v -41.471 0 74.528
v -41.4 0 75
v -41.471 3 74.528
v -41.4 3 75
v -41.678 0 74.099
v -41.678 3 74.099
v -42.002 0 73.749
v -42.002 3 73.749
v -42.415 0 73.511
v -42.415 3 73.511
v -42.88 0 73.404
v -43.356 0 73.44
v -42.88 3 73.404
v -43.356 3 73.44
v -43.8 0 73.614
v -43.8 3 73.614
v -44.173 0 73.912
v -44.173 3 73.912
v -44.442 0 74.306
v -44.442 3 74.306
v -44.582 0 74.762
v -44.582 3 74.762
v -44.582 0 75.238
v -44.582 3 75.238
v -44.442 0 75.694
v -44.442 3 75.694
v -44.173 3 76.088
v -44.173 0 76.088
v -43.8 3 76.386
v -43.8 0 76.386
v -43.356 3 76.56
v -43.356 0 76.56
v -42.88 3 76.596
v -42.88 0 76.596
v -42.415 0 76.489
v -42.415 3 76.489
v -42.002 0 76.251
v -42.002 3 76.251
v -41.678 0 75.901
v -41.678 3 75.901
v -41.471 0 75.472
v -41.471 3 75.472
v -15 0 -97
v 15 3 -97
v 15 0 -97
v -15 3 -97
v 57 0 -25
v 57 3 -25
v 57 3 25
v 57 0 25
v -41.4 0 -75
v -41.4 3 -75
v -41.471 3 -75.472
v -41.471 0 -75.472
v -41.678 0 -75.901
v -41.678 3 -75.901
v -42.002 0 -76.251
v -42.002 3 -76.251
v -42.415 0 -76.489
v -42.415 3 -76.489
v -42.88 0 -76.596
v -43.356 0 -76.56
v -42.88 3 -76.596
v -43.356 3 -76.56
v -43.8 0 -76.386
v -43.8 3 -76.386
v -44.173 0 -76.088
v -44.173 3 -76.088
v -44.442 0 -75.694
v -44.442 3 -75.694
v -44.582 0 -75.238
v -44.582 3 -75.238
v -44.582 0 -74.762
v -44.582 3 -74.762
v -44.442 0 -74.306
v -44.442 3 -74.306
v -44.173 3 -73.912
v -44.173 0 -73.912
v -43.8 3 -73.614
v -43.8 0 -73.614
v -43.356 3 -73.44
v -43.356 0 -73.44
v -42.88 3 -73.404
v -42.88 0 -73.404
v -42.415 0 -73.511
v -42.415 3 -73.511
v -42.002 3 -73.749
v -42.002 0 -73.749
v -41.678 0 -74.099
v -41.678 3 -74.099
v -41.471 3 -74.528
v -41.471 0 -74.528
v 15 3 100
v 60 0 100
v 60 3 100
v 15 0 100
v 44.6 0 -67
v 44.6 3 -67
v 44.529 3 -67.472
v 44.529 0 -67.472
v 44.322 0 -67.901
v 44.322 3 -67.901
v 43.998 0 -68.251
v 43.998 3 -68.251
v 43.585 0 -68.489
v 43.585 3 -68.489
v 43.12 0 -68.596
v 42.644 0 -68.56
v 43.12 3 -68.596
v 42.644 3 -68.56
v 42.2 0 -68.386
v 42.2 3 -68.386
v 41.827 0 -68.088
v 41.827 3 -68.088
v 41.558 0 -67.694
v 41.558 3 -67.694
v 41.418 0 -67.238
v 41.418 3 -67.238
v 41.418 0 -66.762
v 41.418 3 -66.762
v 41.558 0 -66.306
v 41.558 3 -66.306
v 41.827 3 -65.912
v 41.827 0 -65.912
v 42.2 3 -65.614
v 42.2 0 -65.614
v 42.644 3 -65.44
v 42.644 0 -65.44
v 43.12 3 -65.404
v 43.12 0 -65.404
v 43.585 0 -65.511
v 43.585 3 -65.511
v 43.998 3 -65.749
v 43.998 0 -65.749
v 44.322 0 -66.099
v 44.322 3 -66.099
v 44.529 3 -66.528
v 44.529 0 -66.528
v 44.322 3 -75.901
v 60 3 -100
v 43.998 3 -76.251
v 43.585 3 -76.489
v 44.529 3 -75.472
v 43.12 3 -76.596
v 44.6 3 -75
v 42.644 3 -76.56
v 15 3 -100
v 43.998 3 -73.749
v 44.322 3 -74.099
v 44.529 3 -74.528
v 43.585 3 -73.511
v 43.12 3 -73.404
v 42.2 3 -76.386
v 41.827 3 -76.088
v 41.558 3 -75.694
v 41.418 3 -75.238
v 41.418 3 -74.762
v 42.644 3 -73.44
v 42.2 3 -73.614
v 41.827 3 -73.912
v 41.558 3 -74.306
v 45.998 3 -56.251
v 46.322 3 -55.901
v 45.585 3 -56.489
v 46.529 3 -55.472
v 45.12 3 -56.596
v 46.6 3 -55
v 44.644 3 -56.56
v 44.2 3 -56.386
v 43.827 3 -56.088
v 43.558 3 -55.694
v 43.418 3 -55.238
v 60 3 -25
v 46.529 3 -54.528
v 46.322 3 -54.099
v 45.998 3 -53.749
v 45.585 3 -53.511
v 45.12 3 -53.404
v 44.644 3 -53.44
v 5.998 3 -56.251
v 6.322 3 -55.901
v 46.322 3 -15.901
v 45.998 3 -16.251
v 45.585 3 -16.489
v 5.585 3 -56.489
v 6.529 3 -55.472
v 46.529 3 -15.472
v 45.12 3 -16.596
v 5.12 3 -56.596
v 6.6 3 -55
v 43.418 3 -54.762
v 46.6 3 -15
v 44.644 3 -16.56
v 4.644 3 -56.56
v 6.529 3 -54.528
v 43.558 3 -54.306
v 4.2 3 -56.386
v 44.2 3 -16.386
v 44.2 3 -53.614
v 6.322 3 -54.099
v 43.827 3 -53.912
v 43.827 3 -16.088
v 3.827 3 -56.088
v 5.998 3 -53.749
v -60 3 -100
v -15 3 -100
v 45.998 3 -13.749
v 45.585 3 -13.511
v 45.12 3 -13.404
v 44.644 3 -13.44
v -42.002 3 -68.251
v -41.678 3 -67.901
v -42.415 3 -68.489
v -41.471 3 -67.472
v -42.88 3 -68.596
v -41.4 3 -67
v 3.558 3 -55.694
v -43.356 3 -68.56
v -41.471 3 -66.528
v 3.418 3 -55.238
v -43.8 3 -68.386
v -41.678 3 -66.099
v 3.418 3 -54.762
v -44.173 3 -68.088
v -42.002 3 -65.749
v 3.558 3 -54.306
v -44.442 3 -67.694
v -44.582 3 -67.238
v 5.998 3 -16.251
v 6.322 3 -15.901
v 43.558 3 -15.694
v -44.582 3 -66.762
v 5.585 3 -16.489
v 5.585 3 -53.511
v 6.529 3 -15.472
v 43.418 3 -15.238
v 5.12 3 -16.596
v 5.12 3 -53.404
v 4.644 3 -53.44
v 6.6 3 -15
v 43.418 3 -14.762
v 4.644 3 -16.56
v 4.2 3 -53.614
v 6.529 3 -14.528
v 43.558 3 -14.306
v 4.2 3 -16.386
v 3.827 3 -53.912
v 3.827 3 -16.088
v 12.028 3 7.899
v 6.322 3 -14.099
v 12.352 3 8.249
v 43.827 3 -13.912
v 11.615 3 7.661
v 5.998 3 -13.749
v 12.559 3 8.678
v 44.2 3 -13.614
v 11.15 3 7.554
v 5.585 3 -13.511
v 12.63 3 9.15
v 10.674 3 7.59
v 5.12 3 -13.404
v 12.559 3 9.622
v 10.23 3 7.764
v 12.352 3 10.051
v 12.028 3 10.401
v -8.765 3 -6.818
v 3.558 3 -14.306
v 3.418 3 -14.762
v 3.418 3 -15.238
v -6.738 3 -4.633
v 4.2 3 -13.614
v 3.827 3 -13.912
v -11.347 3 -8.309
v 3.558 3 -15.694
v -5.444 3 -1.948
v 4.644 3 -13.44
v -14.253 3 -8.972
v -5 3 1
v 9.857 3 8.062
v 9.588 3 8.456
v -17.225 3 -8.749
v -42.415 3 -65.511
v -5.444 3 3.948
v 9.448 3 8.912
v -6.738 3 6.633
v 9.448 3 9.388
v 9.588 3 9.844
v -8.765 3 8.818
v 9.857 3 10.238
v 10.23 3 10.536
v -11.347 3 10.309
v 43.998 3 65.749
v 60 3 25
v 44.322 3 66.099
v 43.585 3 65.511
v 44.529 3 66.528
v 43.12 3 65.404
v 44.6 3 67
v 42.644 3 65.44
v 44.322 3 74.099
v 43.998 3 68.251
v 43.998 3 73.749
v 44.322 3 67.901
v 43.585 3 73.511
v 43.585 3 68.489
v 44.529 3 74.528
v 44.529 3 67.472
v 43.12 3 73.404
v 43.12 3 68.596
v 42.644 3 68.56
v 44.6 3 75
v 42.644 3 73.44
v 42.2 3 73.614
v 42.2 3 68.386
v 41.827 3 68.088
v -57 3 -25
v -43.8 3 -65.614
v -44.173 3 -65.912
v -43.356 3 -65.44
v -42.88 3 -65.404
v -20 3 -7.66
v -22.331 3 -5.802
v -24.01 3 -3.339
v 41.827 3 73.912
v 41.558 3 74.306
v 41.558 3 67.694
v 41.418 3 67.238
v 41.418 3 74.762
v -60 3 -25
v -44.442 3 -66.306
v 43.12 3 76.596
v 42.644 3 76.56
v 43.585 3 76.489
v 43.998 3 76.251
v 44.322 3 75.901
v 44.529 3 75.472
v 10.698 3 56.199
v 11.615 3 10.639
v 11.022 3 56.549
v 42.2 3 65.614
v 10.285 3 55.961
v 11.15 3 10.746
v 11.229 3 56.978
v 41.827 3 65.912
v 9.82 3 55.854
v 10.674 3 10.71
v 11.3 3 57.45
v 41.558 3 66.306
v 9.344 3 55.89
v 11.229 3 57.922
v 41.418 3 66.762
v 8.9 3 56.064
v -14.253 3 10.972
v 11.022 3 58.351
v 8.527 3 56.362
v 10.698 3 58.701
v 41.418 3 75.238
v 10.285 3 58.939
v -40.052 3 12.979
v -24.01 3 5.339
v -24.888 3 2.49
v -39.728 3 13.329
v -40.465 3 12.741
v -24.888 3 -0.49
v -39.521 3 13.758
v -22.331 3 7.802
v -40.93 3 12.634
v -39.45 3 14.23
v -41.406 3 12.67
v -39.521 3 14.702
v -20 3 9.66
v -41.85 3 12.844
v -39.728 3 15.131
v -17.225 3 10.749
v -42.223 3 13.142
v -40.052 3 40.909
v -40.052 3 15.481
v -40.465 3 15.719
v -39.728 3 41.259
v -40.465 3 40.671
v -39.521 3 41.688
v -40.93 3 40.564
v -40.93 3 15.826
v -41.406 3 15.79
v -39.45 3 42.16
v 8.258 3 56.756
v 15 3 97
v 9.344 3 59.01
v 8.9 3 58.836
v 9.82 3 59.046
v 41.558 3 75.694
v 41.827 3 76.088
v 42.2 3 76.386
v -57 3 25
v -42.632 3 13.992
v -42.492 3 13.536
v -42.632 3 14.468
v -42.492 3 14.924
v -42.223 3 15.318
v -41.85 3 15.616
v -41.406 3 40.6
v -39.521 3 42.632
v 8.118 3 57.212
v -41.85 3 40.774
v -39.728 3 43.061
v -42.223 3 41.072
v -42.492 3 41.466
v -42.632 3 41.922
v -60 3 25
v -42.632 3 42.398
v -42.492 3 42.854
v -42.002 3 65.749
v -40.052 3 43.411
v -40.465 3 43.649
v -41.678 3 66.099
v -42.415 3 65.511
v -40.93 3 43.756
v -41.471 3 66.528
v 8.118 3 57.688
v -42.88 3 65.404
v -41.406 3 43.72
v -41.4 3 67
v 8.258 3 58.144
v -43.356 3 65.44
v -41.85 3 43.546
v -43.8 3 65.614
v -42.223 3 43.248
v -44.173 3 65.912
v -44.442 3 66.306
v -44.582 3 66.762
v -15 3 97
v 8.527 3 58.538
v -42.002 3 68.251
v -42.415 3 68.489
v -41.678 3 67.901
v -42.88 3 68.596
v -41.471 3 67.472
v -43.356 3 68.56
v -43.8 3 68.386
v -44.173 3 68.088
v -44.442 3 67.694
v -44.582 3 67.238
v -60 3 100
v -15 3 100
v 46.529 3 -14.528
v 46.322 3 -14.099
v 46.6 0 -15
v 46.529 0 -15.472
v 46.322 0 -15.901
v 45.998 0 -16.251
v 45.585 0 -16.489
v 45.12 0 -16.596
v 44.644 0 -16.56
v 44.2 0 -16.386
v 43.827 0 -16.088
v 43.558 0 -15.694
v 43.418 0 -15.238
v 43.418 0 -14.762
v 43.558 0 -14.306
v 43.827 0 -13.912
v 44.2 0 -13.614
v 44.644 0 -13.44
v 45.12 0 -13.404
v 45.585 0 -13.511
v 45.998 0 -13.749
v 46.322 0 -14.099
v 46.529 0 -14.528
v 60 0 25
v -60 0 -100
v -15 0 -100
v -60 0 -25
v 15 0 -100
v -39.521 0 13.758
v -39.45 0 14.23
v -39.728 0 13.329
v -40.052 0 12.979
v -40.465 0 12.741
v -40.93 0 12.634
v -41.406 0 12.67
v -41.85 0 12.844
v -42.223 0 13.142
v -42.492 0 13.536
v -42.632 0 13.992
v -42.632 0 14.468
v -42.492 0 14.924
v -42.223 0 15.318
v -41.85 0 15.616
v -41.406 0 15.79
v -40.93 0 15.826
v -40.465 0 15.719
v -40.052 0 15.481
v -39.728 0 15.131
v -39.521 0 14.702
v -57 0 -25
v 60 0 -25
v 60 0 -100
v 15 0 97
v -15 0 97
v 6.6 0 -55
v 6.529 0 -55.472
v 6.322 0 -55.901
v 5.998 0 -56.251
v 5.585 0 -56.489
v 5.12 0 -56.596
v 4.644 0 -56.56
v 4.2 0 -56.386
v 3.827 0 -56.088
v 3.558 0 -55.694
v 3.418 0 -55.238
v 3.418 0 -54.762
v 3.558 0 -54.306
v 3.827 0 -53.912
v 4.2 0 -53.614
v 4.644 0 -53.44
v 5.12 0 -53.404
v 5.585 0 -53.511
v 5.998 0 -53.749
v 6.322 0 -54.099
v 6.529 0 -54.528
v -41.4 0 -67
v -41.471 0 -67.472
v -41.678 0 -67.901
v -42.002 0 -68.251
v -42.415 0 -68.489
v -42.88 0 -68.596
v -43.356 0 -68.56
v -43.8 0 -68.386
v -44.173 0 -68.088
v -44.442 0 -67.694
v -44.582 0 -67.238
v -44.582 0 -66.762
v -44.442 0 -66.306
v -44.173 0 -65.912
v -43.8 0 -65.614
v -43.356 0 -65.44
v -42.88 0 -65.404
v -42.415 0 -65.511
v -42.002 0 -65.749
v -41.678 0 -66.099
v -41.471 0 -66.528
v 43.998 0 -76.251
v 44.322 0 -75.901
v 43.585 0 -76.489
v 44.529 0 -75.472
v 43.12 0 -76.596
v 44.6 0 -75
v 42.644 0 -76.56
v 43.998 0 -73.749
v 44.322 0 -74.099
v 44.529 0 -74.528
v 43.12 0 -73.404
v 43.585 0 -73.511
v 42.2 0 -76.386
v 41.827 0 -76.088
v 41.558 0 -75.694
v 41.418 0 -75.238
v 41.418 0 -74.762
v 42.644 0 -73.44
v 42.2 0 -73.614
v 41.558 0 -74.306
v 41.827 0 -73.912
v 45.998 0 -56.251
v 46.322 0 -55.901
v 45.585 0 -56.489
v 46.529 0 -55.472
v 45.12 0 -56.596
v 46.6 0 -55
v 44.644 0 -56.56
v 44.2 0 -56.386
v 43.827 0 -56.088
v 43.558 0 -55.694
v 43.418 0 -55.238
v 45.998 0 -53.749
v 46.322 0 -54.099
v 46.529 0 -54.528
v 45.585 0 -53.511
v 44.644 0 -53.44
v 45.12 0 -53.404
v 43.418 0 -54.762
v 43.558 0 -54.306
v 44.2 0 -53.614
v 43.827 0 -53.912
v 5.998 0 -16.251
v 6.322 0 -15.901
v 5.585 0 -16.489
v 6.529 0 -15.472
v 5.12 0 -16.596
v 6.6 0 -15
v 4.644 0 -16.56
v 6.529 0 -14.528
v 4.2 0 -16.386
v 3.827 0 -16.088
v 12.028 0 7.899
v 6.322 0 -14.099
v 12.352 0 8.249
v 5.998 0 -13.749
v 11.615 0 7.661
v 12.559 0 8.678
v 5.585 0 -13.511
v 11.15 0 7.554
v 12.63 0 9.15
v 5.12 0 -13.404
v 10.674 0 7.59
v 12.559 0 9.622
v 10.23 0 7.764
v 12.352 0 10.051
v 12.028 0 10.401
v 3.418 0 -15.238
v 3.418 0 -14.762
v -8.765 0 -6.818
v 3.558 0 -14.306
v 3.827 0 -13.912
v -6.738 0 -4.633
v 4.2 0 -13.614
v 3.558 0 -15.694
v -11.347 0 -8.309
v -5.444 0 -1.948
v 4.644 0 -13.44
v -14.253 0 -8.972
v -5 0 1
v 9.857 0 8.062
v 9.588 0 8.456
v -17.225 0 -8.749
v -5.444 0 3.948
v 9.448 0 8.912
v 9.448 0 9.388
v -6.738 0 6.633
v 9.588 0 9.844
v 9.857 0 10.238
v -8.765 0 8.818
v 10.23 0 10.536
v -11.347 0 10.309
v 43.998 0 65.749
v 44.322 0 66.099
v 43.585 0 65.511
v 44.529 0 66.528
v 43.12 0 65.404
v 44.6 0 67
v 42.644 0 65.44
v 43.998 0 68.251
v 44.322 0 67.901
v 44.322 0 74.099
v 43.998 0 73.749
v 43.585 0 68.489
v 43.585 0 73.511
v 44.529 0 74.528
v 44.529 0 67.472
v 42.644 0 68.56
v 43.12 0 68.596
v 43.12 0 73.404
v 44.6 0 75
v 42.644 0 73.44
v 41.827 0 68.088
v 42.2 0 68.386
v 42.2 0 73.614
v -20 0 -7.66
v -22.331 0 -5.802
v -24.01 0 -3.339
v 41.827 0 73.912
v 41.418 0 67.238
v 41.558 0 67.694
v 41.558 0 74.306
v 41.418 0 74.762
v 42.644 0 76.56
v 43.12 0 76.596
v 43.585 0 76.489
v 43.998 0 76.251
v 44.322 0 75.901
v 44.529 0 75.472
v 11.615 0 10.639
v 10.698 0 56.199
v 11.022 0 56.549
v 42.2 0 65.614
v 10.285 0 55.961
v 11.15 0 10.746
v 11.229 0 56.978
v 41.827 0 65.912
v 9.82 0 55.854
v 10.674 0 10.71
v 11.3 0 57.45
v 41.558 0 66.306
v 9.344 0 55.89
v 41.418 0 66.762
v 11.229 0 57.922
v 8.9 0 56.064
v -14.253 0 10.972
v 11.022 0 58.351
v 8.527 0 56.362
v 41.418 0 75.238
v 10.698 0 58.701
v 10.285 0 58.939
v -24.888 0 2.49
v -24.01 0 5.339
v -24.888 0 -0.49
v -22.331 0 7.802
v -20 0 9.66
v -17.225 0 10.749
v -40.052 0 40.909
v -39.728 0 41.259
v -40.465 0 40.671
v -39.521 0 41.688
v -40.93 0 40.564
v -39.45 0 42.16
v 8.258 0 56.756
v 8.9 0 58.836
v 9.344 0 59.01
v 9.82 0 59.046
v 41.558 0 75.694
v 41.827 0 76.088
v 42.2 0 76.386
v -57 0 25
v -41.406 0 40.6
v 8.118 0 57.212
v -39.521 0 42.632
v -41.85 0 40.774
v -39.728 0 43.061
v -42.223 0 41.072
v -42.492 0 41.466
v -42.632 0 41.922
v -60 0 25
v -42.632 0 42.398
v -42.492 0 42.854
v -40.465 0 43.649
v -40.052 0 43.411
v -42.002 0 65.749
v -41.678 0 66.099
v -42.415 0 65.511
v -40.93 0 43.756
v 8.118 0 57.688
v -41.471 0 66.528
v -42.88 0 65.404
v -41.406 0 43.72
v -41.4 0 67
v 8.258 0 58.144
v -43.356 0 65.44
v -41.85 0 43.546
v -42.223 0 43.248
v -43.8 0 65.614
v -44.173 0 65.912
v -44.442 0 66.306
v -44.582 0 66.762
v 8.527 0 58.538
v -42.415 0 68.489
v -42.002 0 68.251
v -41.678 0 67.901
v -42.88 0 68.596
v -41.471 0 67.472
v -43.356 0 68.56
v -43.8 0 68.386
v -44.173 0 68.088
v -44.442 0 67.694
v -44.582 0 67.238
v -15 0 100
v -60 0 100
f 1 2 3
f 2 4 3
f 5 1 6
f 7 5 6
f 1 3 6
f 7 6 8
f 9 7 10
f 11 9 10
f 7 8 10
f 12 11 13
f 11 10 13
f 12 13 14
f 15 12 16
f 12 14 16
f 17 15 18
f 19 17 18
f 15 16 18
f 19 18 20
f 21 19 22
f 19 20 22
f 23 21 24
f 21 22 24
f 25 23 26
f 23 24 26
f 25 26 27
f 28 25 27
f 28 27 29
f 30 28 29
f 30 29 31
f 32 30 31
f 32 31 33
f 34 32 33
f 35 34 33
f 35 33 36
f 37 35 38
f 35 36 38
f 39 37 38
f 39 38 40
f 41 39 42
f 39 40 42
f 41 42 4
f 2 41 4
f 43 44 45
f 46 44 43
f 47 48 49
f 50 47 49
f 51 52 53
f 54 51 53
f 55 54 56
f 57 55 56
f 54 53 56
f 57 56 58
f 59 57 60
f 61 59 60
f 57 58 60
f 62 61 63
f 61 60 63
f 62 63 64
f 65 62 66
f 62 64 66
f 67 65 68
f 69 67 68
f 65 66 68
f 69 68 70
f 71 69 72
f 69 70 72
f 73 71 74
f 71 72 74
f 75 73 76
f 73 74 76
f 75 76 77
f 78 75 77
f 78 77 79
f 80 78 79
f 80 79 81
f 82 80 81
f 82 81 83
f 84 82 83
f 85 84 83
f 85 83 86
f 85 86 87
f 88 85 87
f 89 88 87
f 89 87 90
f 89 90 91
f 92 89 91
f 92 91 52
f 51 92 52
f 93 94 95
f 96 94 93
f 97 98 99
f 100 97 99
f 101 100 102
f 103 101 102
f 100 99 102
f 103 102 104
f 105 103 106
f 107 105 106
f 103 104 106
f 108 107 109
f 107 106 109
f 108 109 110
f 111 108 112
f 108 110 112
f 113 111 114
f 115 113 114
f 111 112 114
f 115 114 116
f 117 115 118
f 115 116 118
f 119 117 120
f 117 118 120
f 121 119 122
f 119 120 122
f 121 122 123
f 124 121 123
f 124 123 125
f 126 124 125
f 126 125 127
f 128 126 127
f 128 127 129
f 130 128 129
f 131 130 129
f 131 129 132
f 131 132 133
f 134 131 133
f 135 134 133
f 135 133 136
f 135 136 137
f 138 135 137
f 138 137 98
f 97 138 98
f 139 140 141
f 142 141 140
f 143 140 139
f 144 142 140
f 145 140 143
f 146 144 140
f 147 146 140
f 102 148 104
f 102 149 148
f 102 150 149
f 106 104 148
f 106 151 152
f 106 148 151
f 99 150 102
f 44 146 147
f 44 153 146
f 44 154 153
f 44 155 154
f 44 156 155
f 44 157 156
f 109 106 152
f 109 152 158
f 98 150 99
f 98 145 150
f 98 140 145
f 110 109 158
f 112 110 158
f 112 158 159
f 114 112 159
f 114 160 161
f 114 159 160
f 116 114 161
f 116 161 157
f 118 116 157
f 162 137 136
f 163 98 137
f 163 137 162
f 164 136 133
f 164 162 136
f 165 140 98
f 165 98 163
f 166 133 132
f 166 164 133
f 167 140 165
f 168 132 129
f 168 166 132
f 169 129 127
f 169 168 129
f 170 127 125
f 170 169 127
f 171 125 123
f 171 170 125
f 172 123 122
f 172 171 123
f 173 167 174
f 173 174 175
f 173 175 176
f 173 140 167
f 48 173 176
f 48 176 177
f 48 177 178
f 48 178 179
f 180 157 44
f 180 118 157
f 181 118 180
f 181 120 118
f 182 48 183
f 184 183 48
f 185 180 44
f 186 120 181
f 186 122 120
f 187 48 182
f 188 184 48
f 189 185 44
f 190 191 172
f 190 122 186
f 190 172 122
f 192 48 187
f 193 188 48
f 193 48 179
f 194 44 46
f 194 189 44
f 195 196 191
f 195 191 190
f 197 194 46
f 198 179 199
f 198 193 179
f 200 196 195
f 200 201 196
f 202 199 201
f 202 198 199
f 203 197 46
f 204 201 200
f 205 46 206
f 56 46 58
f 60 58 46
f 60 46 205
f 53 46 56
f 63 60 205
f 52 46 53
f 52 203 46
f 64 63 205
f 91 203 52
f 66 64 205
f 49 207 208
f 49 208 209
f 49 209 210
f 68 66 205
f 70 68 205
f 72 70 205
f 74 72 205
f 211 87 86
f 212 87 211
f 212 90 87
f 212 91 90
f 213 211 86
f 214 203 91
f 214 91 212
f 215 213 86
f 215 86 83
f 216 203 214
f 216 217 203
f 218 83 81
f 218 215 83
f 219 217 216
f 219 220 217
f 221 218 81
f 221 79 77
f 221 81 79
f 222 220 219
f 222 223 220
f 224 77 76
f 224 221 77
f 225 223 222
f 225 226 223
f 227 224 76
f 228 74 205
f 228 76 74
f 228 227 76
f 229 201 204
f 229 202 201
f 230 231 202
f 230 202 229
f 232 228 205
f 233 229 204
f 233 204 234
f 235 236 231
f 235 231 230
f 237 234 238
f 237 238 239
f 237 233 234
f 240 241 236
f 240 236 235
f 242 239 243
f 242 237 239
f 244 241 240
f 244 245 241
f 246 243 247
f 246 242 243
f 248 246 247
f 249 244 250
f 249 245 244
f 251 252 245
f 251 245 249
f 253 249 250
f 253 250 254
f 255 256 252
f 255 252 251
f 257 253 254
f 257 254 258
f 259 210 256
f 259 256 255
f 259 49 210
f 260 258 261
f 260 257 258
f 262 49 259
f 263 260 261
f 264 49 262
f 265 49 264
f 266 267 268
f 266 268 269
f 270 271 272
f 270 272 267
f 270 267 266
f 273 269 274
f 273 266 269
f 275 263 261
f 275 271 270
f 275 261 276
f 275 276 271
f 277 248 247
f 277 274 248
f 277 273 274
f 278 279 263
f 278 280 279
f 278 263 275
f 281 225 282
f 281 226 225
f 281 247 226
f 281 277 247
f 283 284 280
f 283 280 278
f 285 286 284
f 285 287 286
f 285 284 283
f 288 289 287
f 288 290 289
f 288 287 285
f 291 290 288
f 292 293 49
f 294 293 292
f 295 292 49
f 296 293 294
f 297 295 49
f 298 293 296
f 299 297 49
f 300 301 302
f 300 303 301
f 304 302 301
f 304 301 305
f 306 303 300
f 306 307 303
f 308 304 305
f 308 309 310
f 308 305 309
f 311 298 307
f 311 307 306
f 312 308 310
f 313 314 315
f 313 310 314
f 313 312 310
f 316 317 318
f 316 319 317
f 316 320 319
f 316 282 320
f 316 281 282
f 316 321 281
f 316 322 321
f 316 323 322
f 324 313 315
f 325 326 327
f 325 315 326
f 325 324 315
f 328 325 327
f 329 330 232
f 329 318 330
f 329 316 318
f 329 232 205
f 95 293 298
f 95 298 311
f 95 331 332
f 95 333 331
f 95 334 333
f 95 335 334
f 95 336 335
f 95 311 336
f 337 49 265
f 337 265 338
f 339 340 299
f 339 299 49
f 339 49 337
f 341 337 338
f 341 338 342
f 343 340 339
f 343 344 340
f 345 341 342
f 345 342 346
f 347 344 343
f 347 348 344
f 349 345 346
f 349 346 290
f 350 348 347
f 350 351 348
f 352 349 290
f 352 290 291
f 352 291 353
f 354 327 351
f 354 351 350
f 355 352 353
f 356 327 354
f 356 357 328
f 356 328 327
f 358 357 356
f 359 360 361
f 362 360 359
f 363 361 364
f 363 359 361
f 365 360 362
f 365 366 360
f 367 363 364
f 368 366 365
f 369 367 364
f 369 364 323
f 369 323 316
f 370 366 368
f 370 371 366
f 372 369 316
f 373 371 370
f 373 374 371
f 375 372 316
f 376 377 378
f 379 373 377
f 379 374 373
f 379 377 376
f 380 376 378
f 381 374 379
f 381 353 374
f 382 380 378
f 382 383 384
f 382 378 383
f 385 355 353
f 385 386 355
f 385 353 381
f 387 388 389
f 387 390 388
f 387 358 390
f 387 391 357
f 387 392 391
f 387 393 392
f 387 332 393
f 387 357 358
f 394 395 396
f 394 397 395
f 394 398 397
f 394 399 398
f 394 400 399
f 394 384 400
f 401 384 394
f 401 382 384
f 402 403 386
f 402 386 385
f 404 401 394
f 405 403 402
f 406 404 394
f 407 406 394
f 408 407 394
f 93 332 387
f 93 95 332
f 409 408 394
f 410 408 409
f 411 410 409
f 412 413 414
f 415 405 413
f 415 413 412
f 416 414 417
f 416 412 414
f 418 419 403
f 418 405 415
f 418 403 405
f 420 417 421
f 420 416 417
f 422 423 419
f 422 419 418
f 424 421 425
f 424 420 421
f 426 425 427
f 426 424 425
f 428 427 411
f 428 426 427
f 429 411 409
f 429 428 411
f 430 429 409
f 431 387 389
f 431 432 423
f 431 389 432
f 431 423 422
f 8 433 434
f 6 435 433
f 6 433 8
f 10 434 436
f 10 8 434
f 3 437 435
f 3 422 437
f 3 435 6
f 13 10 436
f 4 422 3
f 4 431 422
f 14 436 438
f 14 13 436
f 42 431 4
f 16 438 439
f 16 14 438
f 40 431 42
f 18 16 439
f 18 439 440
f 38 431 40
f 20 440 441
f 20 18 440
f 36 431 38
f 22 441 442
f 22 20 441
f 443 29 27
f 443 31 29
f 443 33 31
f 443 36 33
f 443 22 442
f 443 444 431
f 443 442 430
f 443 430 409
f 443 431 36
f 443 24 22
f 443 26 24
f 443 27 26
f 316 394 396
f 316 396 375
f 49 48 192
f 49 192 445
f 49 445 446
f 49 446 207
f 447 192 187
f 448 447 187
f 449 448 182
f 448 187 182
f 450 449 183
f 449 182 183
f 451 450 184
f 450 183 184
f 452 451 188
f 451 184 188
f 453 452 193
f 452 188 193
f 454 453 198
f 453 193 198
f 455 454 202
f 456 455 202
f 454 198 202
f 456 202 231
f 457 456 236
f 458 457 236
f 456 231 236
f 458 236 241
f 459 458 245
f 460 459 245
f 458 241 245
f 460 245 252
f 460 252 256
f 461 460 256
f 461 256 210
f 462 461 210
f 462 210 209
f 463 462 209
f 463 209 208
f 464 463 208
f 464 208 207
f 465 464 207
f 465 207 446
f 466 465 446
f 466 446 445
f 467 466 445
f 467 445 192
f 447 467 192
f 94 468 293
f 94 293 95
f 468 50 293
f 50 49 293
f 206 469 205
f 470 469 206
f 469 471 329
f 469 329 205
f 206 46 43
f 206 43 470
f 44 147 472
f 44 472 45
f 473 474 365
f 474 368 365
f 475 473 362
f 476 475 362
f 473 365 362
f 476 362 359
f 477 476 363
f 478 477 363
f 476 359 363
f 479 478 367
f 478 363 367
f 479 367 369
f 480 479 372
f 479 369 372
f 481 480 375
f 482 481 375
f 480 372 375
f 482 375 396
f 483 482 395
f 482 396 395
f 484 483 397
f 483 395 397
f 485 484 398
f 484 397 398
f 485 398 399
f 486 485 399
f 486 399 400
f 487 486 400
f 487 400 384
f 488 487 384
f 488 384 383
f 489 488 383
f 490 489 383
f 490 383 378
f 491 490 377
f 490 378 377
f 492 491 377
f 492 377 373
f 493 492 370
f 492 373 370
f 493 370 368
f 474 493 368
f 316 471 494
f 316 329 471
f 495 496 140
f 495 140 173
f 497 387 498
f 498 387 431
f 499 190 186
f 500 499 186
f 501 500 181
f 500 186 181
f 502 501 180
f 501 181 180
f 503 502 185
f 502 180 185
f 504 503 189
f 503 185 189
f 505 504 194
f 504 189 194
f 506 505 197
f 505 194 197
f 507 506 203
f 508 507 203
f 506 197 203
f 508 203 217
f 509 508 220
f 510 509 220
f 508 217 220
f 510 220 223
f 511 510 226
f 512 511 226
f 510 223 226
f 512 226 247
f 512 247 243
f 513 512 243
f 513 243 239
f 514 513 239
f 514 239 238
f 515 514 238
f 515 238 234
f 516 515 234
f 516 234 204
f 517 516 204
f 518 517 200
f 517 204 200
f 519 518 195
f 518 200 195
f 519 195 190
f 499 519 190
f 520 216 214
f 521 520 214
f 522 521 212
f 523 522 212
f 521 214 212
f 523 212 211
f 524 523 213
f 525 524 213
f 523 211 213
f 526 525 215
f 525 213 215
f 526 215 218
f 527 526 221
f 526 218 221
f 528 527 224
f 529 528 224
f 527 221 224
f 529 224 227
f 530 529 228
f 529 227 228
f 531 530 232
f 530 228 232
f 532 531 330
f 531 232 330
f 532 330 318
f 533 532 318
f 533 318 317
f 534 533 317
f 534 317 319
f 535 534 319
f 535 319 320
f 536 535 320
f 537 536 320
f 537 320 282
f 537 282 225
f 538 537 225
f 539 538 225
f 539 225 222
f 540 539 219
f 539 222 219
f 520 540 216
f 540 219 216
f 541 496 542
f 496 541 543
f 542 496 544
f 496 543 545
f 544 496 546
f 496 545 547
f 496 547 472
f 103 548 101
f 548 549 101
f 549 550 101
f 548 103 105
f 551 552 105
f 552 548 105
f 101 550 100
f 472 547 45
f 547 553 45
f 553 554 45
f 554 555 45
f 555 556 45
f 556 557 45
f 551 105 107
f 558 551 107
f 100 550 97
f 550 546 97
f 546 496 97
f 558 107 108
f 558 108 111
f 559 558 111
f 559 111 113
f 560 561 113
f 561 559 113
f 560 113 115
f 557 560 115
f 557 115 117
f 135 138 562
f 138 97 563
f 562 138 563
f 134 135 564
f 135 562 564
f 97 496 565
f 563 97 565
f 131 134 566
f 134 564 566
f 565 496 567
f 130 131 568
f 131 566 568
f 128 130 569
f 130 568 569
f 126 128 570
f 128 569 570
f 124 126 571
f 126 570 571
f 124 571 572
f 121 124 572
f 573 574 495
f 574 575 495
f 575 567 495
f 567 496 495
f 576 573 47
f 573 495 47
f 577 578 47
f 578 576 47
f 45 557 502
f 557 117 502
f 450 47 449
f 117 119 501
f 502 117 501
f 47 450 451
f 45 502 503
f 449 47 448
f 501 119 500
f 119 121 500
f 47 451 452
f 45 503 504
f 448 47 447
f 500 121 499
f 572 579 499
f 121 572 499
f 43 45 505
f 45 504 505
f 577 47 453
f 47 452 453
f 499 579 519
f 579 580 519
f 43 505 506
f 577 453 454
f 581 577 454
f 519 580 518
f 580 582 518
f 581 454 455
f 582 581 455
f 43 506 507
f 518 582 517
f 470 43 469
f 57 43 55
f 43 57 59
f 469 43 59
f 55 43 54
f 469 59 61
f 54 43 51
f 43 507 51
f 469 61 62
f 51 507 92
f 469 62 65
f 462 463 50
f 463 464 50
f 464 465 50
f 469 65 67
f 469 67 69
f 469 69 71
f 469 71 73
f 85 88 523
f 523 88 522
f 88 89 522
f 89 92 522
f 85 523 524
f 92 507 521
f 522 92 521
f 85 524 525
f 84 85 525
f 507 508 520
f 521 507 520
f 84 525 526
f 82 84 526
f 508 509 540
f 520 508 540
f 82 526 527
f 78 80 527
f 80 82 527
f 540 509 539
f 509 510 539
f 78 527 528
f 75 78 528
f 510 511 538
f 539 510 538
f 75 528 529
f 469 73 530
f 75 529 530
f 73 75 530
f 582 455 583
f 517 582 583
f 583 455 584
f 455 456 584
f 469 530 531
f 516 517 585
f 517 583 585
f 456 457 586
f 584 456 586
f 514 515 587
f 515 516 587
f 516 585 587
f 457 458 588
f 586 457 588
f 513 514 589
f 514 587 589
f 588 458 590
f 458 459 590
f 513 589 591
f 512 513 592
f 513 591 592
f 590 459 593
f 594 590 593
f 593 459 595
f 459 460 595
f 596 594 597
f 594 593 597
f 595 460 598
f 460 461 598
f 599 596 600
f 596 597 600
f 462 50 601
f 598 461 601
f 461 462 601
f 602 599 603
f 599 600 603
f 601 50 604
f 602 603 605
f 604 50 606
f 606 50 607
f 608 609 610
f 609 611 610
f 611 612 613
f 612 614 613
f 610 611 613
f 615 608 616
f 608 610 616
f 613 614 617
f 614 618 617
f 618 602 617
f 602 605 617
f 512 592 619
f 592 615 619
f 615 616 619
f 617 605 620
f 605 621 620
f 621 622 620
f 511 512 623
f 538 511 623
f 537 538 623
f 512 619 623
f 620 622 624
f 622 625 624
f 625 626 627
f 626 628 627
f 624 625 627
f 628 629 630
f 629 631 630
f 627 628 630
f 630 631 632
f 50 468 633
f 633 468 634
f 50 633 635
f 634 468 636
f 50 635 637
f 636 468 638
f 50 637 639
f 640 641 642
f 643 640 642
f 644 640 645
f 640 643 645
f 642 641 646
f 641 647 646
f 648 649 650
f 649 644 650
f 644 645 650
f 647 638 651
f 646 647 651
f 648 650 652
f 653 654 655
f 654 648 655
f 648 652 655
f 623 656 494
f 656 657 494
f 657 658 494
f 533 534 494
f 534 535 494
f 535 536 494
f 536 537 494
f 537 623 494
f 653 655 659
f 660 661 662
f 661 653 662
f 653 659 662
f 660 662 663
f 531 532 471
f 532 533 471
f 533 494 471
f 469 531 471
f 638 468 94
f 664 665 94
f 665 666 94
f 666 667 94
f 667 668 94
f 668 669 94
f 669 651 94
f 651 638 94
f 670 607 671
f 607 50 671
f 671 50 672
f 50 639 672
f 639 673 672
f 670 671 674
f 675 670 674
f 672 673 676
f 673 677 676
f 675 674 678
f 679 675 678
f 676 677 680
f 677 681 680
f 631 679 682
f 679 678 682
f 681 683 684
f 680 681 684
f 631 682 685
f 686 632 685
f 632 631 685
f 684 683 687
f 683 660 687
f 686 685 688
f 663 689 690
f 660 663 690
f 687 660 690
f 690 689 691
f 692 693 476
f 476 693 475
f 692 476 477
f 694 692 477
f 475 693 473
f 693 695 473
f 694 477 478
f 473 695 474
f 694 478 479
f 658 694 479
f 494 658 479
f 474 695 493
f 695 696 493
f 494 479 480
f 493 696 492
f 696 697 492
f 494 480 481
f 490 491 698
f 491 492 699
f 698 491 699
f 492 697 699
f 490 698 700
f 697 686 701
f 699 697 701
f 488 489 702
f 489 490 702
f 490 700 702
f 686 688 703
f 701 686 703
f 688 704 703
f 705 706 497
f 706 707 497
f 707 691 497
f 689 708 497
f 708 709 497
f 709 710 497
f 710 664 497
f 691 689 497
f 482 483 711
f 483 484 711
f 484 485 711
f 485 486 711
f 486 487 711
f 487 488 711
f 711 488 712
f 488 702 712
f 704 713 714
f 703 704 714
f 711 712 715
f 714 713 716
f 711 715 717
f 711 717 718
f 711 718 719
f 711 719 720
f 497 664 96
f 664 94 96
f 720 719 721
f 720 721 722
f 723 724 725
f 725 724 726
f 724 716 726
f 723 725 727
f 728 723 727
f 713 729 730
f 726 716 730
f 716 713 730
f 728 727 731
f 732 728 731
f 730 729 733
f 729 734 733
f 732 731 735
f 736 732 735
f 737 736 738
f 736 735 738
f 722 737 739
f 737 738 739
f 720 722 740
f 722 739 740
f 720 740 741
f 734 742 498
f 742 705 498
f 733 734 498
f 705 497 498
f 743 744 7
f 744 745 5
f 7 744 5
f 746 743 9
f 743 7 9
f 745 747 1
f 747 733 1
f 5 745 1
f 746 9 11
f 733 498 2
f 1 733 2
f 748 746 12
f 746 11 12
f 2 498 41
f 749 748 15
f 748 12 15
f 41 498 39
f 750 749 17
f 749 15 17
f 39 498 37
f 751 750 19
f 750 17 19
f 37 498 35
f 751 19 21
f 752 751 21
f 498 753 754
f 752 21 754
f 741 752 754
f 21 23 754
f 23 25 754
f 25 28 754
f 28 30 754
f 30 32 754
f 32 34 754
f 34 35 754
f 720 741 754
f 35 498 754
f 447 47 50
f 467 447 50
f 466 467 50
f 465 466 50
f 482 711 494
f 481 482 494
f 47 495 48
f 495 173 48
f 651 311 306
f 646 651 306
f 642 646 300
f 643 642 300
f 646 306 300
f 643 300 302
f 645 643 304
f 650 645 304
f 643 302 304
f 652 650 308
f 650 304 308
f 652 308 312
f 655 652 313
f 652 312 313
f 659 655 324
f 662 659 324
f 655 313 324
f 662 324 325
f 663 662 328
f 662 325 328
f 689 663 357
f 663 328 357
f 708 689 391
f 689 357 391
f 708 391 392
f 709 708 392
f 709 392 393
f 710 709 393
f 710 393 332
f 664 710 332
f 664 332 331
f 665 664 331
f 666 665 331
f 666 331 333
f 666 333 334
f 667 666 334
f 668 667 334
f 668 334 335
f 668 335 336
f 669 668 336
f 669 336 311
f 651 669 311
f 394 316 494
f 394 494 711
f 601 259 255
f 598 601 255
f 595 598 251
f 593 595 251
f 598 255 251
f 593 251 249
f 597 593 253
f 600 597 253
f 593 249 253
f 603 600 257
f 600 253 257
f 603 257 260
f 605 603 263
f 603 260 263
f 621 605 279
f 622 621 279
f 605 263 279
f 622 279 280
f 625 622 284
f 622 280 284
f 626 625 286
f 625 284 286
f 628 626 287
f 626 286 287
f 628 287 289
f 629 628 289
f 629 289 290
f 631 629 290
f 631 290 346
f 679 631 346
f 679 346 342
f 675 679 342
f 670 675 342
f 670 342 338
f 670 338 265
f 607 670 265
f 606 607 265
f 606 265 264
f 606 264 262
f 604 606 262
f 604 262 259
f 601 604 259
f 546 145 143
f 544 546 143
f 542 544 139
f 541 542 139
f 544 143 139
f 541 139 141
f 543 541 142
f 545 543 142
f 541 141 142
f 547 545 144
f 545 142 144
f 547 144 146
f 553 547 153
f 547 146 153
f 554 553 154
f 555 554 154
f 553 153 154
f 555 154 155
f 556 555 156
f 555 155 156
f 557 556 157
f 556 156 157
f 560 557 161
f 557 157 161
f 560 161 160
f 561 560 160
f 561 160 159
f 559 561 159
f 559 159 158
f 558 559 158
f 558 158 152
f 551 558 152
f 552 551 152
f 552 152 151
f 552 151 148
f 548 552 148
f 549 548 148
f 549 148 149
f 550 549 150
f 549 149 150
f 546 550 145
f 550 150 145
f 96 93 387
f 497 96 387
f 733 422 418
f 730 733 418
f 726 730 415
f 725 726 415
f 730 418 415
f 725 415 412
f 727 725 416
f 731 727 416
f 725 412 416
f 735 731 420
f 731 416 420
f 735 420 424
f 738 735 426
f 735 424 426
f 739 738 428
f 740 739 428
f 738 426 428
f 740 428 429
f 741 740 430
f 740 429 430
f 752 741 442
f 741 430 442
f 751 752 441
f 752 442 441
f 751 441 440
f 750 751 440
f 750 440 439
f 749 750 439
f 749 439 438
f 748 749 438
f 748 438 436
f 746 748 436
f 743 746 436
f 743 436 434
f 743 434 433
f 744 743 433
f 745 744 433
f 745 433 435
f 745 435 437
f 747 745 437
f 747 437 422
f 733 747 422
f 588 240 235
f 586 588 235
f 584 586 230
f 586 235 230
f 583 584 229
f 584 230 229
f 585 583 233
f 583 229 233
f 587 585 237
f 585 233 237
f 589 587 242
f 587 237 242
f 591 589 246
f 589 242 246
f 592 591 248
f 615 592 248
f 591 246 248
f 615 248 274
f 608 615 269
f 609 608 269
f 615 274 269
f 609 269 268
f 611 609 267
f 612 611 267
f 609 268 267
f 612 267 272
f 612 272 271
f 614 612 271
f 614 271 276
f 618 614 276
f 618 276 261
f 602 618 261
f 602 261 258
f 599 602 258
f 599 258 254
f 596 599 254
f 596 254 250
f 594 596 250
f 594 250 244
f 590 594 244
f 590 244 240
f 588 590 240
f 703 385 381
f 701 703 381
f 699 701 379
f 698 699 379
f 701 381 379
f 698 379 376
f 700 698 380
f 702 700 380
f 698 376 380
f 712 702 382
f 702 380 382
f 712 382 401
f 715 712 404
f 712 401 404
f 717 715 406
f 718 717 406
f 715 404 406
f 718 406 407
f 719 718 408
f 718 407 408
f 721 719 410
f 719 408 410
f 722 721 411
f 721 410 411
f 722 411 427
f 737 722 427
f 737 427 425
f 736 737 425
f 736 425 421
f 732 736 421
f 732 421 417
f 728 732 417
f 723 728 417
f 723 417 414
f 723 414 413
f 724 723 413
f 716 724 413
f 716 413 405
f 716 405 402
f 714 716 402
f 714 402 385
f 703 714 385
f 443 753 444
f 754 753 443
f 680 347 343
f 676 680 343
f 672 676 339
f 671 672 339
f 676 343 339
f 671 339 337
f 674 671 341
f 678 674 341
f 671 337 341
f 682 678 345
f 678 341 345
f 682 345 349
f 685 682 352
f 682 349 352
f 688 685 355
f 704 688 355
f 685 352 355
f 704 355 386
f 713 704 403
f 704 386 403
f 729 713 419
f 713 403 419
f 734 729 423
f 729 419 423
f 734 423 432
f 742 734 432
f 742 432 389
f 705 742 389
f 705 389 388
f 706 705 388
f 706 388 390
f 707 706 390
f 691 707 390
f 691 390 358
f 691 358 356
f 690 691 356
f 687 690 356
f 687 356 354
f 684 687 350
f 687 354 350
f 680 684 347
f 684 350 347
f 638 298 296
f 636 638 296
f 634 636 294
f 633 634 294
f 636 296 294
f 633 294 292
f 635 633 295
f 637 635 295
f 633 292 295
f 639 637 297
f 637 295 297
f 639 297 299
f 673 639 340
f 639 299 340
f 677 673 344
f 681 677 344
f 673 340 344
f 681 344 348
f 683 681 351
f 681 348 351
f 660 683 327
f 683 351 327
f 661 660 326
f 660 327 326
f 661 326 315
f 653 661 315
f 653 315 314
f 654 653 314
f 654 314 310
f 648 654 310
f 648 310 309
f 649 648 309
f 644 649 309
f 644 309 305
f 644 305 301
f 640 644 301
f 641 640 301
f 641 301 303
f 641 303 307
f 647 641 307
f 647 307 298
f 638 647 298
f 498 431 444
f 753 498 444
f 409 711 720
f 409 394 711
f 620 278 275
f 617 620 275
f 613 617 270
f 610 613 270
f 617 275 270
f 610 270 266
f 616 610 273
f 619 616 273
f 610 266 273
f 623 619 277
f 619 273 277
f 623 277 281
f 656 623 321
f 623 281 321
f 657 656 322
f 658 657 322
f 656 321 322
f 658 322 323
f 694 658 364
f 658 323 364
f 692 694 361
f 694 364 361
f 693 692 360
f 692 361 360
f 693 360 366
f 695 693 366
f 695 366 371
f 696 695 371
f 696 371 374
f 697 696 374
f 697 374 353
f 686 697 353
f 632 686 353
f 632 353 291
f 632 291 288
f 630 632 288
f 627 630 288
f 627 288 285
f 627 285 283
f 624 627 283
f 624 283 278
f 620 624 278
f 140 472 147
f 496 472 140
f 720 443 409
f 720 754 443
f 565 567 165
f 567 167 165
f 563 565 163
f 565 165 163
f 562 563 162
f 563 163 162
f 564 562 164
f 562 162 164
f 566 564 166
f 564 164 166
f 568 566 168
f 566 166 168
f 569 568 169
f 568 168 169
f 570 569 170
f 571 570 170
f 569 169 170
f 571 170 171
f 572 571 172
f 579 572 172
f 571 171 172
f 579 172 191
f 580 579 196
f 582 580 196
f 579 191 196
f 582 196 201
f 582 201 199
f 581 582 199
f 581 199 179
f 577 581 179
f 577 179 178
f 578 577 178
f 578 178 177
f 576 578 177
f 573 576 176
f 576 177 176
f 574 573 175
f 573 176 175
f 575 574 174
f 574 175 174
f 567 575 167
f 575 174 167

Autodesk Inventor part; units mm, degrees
ref_plane "YZ Plane" through (0, 0, 0) normal (1, 0, 0) x (0, 1, 0)
ref_plane "XZ Plane" through (0, 0, 0) normal (0, 1, 0) x (-1, 0, 0)
ref_plane "XY Plane" through (0, 0, 0) normal (0, 0, 1) x (1, 0, 0)
sketch "스케치1" plane through (0, 0, 0) normal (0, 1, 0) x (-1, 0, 0)
  line L0 (60, -100) -> (-60, -100)
  line L1 (-60, -100) -> (-60, 100)
  line L2 (-60, 100) -> (60, 100)
  line L3 (60, 100) -> (60, -100)
  line L4 (60, -100) -> (-60, 100) construction
  line L5 (-60, -100) -> (60, 100) construction
  point P0 (0, 0)
  dimension "d0" = 200
  dimension "d1" = 120
extrude "돌출1" add sketch "스케치1" along normal blind 3
sketch "스케치3" plane through (0, 3, 0) normal (0, 1, 0) x (1, 0, 0)
  line L0 (-43.6, -60) -> (25, -60)
  line L1 (25, -60) -> (25, -6.6)
  line L2 (25, -6.6) -> (-43.6, -6.6)
  line L3 (-43.6, -6.6) -> (-43.6, -60)
  circle A0 centre (9.7, -57.45) radius 1.6
  circle A1 centre (11.03, -9.15) radius 1.6
  circle A2 centre (-41.05, -42.16) radius 1.6
  circle A3 centre (-41.05, -14.23) radius 1.6
  line L4 (60, -100) -> (60, 100) projected
  line L5 (-60, -100) -> (60, -100) projected
  point P0 (0, 0)
  point P1 (0, 0)
  dimension "d22" = 68.6
  dimension "d23" = 53.4
  dimension "d26" = 3.2
  dimension "d27" = 15.3
  dimension "d28" = 2.55
  dimension "d29" = 3.2
  dimension "d30" = 13.97
  dimension "d31" = 2.55
  dimension "d32" = 3.2
  dimension "d33" = 35.56
  dimension "d34" = 3.2
  dimension "d35" = 2.55
  dimension "d36" = 2.55
  dimension "d37" = 7.63
  dimension "d38" = 35
  dimension "d40" = 40
extrude "돌출2" cut sketch "스케치3" against normal through all contours A0 | A1 | A2 | A3
sketch "스케치4" plane through (0, 3, 0) normal (0, 1, 0) x (1, 0, 0)
  line L0 (5, 15) -> (45, 15)
  line L1 (45, 15) -> (45, 55)
  line L2 (45, 55) -> (5, 55)
  line L3 (5, 55) -> (5, 15)
  circle A0 centre (5, 15) radius 1.6
  circle A1 centre (5, 55) radius 1.6
  circle A2 centre (45, 55) radius 1.6
  circle A3 centre (45, 15) radius 1.6
  line L4 (-47.9371, 14.7215) -> (-7.9371, 14.7215)
  line L5 (-7.9371, 14.7215) -> (-7.9371, 64.7215)
  line L6 (-7.9371, 64.7215) -> (-47.9371, 64.7215)
  line L7 (-47.9371, 64.7215) -> (-47.9371, 14.7215)
  line L8 (60, -100) -> (60, 100) projected
  line L9 (60, 100) -> (-60, 100) projected
  circle A4 centre (-15, -1) radius 10
  line L10 (-60, 100) -> (-60, -100) projected
  point P0 (0, 0)
  point P1 (0, 0)
  dimension "d43" = 40
  dimension "d44" = 40
  dimension "d47" = 3.2
  dimension "d48" = 3.2
  dimension "d49" = 3.2
  dimension "d50" = 3.2
  dimension "d51" = 40
  dimension "d52" = 50
  dimension "d53" = 15
  dimension "d54" = 45
  dimension "d56" = 20
  dimension "d69" = 45
  dimension "d70" = 101
extrude "돌출3" cut sketch "스케치4" against normal through all contours L3 A0 L0 | L0 A0 L3 | A3 L1 L0 | L0 L1 A3 | A1 L2 L3 | L3 L2 A1 | A2 L2 L1 | L1 L2 A2 | A4
sketch "스케치5" plane through (0, 3, 0) normal (0, 1, 0) x (1, 0, 0)
  line L0 (57, -25) -> (61.988, -25)
  line L1 (61.988, -25) -> (61.988, 25)
  line L2 (61.988, 25) -> (57, 25)
  line L3 (57, 25) -> (57, -25)
  line L4 (60, -100) -> (60, 100) projected
  line L5 (60, 100) -> (-60, 100) projected
  line L6 (0, -100) -> (0, 100)
  line L7 (60, 100) -> (-60, 100) projected
  line L8 (-57, -25) -> (-61.988, -25)
  line L9 (-61.988, -25) -> (-61.988, 25)
  line L10 (-61.988, 25) -> (-57, 25)
  line L11 (-57, 25) -> (-57, -25)
  point P0 (0, 0)
  dimension "d59" = 50
  dimension "d60" = 3
  dimension "d61" = 75
extrude "돌출4" cut sketch "스케치5" against normal through all
sketch "스케치6" plane through (0, 3, 0) normal (0, 1, 0) x (1, 0, 0)
  line L0 (-15, -110.8891) -> (15, -110.8891)
  line L1 (15, -110.8891) -> (15, -97)
  line L2 (15, -97) -> (-15, -97)
  line L3 (-15, -97) -> (-15, -110.8891)
  line L4 (-60, -100) -> (60, -100) projected
  line L5 (-60, -25) -> (-60, -100) projected
  line L6 (-57, -25) -> (-57, 25) projected
  line L7 (-57, 0) -> (56.7319, 0)
  line L8 (-15, 110.8891) -> (15, 110.8891)
  line L9 (15, 110.8891) -> (15, 97)
  line L10 (15, 97) -> (-15, 97)
  line L11 (-15, 97) -> (-15, 110.8891)
  point P0 (0, 0)
  dimension "d64" = 30
  dimension "d65" = 3
  dimension "d66" = 45
extrude "돌출5" cut sketch "스케치6" against normal through all
sketch "스케치7" plane through (0, 3, 0) normal (0, 1, 0) x (1, 0, 0)
  point P0 (0, 0)
sketch "스케치9" plane through (0, 3, 0) normal (0, 1, 0) x (1, 0, 0)
  circle A0 centre (-43, -75) radius 1.6
  circle A1 centre (-43, -67) radius 1.6
  line L0 (-60, -25) -> (-60, -100) projected
  line L1 (-60, -100) -> (-15, -100) projected
  line L2 (-15, -97) -> (15, -97) projected
  line L3 (0, -97) -> (0, 96.8174)
  line L4 (-57, -25) -> (-57, 25) projected
  line L5 (-57, 0) -> (57, 0)
  line L6 (57, 25) -> (57, -25) projected
  circle A2 centre (-43, 75) radius 1.6
  circle A3 centre (-43, 67) radius 1.6
  circle A4 centre (43, -75) radius 1.6
  circle A5 centre (43, -67) radius 1.6
  circle A6 centre (43, 75) radius 1.6
  circle A7 centre (43, 67) radius 1.6
  point P0 (0, 0)
  dimension "d75" = 3.2
  dimension "d76" = 3.2
  dimension "d77" = 8
  dimension "d78" = 17
  dimension "d79" = 17
  dimension "d80" = 25
extrude "돌출7" cut sketch "스케치9" against normal through all
properties part number "본체 밑판 레이저 수정"
